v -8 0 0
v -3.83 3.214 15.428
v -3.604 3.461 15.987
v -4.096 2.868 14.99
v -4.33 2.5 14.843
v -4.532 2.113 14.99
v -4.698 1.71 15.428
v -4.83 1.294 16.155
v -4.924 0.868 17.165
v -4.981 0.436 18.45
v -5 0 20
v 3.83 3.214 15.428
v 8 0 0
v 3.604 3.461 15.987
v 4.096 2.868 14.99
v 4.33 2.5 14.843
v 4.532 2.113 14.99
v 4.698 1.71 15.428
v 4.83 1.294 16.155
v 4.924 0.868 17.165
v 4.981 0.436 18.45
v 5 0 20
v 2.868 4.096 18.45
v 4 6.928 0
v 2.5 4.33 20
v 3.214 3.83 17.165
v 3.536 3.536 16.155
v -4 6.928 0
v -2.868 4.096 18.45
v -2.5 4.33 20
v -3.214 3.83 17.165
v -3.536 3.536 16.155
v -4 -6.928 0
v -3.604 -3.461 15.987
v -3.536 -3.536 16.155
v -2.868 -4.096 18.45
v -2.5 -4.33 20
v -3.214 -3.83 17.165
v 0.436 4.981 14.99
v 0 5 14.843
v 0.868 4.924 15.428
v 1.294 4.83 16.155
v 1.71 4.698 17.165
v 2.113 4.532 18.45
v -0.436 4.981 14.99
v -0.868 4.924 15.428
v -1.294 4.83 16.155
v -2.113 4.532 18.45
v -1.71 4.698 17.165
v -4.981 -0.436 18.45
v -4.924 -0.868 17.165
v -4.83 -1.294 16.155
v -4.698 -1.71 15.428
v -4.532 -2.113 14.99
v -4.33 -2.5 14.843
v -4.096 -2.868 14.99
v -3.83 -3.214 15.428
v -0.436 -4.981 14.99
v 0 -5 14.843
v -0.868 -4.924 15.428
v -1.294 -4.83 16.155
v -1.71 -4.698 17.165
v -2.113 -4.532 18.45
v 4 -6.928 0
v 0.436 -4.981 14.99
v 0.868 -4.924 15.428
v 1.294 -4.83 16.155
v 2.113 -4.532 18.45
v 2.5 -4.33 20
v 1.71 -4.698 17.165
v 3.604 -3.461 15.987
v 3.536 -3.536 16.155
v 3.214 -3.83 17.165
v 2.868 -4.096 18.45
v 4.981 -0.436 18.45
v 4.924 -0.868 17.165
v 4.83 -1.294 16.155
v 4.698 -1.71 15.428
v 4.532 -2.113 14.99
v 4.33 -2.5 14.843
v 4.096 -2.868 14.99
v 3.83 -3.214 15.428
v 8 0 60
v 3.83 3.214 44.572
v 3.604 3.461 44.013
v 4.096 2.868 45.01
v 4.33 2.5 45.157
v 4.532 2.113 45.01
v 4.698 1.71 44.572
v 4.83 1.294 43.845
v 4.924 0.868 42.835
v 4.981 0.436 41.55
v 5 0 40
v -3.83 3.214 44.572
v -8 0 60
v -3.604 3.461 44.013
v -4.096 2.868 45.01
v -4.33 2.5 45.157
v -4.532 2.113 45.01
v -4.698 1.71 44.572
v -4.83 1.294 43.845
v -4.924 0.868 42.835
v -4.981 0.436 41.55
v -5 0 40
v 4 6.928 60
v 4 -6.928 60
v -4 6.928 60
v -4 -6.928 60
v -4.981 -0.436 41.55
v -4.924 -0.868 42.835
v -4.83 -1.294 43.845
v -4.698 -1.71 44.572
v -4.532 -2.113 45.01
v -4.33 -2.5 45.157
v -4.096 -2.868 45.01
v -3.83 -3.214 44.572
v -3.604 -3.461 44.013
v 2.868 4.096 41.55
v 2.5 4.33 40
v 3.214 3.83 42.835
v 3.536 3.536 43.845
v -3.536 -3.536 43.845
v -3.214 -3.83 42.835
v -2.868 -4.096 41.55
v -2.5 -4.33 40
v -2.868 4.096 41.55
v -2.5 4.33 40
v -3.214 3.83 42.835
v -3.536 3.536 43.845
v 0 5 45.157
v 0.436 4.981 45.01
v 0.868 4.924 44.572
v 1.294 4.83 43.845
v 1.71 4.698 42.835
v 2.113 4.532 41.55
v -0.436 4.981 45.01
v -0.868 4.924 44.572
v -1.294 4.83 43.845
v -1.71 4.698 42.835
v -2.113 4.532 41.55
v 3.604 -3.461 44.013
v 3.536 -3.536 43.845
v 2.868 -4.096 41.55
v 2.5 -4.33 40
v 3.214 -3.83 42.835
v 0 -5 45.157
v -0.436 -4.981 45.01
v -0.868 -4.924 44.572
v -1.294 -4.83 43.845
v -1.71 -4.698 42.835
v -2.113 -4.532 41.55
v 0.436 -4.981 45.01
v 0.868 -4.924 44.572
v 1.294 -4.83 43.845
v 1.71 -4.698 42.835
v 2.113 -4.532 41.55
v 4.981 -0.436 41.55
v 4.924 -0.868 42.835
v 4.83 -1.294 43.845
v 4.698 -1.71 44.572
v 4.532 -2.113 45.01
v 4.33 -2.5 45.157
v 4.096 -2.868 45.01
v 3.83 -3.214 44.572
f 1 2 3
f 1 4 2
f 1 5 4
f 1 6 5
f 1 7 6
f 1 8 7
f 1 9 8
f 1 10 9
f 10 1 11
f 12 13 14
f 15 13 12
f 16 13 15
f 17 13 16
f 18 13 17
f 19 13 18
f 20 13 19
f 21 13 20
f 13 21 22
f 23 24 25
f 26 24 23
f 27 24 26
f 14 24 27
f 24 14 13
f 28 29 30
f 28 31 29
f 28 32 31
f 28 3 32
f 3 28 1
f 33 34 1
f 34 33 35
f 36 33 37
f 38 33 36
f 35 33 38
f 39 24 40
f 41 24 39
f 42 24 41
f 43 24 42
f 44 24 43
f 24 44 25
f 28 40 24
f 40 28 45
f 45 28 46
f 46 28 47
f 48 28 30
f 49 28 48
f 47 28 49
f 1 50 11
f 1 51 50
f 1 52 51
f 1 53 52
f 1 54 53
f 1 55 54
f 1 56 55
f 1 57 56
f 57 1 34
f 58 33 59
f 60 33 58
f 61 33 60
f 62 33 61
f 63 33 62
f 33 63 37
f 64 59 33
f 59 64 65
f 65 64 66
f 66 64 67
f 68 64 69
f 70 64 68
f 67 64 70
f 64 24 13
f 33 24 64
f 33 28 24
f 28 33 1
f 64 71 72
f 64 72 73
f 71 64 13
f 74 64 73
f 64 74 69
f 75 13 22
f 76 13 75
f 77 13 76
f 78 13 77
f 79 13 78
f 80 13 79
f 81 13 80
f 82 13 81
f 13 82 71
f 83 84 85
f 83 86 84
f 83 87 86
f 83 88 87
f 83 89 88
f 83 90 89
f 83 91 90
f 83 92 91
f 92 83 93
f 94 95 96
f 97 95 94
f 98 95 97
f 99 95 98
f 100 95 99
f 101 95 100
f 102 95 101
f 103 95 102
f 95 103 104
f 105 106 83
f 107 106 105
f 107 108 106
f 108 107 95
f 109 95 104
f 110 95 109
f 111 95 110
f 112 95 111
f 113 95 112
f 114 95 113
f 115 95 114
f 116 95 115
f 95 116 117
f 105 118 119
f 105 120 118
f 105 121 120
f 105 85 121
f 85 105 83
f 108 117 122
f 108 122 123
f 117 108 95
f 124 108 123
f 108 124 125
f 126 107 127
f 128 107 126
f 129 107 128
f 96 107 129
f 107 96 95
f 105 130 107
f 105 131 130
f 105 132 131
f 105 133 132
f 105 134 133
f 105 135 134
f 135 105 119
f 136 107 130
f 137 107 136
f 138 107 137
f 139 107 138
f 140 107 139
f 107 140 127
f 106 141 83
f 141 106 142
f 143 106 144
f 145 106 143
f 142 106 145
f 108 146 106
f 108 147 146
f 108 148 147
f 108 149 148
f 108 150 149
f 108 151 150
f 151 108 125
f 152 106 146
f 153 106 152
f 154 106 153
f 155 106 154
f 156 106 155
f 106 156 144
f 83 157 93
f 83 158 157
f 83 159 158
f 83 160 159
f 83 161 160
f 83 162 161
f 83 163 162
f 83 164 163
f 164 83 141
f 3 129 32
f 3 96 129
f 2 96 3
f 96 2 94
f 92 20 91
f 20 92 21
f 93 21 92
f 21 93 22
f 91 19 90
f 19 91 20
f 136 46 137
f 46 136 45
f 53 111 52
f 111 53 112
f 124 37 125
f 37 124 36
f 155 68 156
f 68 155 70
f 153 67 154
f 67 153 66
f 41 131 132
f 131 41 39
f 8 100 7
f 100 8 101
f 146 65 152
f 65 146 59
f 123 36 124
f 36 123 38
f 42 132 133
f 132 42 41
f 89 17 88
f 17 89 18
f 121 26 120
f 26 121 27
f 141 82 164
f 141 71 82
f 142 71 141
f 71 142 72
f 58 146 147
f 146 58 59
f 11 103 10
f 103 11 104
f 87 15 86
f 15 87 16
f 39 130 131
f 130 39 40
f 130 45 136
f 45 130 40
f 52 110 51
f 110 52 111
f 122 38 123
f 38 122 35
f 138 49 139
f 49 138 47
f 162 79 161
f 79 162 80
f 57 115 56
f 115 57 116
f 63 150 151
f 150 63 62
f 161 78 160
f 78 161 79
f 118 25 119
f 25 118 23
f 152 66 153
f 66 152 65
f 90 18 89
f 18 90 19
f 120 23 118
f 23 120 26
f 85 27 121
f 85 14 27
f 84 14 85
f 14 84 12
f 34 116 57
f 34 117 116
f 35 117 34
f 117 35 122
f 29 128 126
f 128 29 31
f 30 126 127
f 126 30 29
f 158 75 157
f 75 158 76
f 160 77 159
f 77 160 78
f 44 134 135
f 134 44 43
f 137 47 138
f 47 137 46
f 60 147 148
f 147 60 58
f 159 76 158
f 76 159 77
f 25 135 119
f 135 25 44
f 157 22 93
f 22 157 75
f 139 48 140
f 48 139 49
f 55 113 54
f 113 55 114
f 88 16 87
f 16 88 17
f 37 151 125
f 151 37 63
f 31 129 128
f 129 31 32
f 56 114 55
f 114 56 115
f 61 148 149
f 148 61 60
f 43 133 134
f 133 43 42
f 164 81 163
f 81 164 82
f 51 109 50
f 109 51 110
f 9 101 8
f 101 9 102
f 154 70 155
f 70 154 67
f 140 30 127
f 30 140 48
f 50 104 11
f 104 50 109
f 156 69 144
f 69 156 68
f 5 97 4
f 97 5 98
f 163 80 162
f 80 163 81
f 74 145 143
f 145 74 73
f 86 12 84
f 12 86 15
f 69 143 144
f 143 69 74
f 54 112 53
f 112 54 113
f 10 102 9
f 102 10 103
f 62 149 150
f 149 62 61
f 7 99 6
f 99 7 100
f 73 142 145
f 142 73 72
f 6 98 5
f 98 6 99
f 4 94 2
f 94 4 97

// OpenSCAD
include <Write.scad>

height = 60;
rad = 5;
base_rad = 8;

sides=6;

plastic = "abs";
layer_height = ".2";
infill = "10%";
walls = "3";
temp = "235";
printer = "bg7";


ztest(
        plastic = "abs",
        layer_height = ".2L",
        infill = "10%",
        walls = "3w",
        temp = "235c",
        printer="bg7");

module ztest(plastic = "abs", layer_height = ".2", infill = "10%", walls = "3", temp = "235", printer="bg7"){
    union(){
        //caps
        for(i=[0,1]) translate([0,0,i*height]) mirror([0,0,i]){
            //cylinder(r1=(rad*1.5)/cos(180/4), r2=rad/cos(180/4), h=height/4, $fn=4);
            cylinder(r1=base_rad, r2=rad, h=height/3, $fn=sides);
        }
        
        //center
        cylinder(r=rad, h=height, $fn=36*2);
        
        //write some info
        writeBase(plastic, 0, 0);
        writeBase(layer_height, 120, 0);
        writeBase(infill, 240, 0);
        writeBase(walls, 0, 1);
        writeBase(temp, 120, 1);
        writeBase(printer, 240, 1);
    }
}

module writeBase(text = "test", rot = 0, top = 0){
   tilt = -atan((base_rad-rad)/(height/3));
    
    translate([0,0,top*height*10/12])
    //mirror([0,0,top])
    translate([0,0,height/12]) 
    rotate([0,0,rot])
    rotate([tilt*top*-2,0,0])
    rotate([tilt,0,0]) writecylinder(text, [0,0,0], (base_rad+rad)/2, 10, t=1, h=rad-1, rotate=90, font="orbitron.dxf", center=true);
}
